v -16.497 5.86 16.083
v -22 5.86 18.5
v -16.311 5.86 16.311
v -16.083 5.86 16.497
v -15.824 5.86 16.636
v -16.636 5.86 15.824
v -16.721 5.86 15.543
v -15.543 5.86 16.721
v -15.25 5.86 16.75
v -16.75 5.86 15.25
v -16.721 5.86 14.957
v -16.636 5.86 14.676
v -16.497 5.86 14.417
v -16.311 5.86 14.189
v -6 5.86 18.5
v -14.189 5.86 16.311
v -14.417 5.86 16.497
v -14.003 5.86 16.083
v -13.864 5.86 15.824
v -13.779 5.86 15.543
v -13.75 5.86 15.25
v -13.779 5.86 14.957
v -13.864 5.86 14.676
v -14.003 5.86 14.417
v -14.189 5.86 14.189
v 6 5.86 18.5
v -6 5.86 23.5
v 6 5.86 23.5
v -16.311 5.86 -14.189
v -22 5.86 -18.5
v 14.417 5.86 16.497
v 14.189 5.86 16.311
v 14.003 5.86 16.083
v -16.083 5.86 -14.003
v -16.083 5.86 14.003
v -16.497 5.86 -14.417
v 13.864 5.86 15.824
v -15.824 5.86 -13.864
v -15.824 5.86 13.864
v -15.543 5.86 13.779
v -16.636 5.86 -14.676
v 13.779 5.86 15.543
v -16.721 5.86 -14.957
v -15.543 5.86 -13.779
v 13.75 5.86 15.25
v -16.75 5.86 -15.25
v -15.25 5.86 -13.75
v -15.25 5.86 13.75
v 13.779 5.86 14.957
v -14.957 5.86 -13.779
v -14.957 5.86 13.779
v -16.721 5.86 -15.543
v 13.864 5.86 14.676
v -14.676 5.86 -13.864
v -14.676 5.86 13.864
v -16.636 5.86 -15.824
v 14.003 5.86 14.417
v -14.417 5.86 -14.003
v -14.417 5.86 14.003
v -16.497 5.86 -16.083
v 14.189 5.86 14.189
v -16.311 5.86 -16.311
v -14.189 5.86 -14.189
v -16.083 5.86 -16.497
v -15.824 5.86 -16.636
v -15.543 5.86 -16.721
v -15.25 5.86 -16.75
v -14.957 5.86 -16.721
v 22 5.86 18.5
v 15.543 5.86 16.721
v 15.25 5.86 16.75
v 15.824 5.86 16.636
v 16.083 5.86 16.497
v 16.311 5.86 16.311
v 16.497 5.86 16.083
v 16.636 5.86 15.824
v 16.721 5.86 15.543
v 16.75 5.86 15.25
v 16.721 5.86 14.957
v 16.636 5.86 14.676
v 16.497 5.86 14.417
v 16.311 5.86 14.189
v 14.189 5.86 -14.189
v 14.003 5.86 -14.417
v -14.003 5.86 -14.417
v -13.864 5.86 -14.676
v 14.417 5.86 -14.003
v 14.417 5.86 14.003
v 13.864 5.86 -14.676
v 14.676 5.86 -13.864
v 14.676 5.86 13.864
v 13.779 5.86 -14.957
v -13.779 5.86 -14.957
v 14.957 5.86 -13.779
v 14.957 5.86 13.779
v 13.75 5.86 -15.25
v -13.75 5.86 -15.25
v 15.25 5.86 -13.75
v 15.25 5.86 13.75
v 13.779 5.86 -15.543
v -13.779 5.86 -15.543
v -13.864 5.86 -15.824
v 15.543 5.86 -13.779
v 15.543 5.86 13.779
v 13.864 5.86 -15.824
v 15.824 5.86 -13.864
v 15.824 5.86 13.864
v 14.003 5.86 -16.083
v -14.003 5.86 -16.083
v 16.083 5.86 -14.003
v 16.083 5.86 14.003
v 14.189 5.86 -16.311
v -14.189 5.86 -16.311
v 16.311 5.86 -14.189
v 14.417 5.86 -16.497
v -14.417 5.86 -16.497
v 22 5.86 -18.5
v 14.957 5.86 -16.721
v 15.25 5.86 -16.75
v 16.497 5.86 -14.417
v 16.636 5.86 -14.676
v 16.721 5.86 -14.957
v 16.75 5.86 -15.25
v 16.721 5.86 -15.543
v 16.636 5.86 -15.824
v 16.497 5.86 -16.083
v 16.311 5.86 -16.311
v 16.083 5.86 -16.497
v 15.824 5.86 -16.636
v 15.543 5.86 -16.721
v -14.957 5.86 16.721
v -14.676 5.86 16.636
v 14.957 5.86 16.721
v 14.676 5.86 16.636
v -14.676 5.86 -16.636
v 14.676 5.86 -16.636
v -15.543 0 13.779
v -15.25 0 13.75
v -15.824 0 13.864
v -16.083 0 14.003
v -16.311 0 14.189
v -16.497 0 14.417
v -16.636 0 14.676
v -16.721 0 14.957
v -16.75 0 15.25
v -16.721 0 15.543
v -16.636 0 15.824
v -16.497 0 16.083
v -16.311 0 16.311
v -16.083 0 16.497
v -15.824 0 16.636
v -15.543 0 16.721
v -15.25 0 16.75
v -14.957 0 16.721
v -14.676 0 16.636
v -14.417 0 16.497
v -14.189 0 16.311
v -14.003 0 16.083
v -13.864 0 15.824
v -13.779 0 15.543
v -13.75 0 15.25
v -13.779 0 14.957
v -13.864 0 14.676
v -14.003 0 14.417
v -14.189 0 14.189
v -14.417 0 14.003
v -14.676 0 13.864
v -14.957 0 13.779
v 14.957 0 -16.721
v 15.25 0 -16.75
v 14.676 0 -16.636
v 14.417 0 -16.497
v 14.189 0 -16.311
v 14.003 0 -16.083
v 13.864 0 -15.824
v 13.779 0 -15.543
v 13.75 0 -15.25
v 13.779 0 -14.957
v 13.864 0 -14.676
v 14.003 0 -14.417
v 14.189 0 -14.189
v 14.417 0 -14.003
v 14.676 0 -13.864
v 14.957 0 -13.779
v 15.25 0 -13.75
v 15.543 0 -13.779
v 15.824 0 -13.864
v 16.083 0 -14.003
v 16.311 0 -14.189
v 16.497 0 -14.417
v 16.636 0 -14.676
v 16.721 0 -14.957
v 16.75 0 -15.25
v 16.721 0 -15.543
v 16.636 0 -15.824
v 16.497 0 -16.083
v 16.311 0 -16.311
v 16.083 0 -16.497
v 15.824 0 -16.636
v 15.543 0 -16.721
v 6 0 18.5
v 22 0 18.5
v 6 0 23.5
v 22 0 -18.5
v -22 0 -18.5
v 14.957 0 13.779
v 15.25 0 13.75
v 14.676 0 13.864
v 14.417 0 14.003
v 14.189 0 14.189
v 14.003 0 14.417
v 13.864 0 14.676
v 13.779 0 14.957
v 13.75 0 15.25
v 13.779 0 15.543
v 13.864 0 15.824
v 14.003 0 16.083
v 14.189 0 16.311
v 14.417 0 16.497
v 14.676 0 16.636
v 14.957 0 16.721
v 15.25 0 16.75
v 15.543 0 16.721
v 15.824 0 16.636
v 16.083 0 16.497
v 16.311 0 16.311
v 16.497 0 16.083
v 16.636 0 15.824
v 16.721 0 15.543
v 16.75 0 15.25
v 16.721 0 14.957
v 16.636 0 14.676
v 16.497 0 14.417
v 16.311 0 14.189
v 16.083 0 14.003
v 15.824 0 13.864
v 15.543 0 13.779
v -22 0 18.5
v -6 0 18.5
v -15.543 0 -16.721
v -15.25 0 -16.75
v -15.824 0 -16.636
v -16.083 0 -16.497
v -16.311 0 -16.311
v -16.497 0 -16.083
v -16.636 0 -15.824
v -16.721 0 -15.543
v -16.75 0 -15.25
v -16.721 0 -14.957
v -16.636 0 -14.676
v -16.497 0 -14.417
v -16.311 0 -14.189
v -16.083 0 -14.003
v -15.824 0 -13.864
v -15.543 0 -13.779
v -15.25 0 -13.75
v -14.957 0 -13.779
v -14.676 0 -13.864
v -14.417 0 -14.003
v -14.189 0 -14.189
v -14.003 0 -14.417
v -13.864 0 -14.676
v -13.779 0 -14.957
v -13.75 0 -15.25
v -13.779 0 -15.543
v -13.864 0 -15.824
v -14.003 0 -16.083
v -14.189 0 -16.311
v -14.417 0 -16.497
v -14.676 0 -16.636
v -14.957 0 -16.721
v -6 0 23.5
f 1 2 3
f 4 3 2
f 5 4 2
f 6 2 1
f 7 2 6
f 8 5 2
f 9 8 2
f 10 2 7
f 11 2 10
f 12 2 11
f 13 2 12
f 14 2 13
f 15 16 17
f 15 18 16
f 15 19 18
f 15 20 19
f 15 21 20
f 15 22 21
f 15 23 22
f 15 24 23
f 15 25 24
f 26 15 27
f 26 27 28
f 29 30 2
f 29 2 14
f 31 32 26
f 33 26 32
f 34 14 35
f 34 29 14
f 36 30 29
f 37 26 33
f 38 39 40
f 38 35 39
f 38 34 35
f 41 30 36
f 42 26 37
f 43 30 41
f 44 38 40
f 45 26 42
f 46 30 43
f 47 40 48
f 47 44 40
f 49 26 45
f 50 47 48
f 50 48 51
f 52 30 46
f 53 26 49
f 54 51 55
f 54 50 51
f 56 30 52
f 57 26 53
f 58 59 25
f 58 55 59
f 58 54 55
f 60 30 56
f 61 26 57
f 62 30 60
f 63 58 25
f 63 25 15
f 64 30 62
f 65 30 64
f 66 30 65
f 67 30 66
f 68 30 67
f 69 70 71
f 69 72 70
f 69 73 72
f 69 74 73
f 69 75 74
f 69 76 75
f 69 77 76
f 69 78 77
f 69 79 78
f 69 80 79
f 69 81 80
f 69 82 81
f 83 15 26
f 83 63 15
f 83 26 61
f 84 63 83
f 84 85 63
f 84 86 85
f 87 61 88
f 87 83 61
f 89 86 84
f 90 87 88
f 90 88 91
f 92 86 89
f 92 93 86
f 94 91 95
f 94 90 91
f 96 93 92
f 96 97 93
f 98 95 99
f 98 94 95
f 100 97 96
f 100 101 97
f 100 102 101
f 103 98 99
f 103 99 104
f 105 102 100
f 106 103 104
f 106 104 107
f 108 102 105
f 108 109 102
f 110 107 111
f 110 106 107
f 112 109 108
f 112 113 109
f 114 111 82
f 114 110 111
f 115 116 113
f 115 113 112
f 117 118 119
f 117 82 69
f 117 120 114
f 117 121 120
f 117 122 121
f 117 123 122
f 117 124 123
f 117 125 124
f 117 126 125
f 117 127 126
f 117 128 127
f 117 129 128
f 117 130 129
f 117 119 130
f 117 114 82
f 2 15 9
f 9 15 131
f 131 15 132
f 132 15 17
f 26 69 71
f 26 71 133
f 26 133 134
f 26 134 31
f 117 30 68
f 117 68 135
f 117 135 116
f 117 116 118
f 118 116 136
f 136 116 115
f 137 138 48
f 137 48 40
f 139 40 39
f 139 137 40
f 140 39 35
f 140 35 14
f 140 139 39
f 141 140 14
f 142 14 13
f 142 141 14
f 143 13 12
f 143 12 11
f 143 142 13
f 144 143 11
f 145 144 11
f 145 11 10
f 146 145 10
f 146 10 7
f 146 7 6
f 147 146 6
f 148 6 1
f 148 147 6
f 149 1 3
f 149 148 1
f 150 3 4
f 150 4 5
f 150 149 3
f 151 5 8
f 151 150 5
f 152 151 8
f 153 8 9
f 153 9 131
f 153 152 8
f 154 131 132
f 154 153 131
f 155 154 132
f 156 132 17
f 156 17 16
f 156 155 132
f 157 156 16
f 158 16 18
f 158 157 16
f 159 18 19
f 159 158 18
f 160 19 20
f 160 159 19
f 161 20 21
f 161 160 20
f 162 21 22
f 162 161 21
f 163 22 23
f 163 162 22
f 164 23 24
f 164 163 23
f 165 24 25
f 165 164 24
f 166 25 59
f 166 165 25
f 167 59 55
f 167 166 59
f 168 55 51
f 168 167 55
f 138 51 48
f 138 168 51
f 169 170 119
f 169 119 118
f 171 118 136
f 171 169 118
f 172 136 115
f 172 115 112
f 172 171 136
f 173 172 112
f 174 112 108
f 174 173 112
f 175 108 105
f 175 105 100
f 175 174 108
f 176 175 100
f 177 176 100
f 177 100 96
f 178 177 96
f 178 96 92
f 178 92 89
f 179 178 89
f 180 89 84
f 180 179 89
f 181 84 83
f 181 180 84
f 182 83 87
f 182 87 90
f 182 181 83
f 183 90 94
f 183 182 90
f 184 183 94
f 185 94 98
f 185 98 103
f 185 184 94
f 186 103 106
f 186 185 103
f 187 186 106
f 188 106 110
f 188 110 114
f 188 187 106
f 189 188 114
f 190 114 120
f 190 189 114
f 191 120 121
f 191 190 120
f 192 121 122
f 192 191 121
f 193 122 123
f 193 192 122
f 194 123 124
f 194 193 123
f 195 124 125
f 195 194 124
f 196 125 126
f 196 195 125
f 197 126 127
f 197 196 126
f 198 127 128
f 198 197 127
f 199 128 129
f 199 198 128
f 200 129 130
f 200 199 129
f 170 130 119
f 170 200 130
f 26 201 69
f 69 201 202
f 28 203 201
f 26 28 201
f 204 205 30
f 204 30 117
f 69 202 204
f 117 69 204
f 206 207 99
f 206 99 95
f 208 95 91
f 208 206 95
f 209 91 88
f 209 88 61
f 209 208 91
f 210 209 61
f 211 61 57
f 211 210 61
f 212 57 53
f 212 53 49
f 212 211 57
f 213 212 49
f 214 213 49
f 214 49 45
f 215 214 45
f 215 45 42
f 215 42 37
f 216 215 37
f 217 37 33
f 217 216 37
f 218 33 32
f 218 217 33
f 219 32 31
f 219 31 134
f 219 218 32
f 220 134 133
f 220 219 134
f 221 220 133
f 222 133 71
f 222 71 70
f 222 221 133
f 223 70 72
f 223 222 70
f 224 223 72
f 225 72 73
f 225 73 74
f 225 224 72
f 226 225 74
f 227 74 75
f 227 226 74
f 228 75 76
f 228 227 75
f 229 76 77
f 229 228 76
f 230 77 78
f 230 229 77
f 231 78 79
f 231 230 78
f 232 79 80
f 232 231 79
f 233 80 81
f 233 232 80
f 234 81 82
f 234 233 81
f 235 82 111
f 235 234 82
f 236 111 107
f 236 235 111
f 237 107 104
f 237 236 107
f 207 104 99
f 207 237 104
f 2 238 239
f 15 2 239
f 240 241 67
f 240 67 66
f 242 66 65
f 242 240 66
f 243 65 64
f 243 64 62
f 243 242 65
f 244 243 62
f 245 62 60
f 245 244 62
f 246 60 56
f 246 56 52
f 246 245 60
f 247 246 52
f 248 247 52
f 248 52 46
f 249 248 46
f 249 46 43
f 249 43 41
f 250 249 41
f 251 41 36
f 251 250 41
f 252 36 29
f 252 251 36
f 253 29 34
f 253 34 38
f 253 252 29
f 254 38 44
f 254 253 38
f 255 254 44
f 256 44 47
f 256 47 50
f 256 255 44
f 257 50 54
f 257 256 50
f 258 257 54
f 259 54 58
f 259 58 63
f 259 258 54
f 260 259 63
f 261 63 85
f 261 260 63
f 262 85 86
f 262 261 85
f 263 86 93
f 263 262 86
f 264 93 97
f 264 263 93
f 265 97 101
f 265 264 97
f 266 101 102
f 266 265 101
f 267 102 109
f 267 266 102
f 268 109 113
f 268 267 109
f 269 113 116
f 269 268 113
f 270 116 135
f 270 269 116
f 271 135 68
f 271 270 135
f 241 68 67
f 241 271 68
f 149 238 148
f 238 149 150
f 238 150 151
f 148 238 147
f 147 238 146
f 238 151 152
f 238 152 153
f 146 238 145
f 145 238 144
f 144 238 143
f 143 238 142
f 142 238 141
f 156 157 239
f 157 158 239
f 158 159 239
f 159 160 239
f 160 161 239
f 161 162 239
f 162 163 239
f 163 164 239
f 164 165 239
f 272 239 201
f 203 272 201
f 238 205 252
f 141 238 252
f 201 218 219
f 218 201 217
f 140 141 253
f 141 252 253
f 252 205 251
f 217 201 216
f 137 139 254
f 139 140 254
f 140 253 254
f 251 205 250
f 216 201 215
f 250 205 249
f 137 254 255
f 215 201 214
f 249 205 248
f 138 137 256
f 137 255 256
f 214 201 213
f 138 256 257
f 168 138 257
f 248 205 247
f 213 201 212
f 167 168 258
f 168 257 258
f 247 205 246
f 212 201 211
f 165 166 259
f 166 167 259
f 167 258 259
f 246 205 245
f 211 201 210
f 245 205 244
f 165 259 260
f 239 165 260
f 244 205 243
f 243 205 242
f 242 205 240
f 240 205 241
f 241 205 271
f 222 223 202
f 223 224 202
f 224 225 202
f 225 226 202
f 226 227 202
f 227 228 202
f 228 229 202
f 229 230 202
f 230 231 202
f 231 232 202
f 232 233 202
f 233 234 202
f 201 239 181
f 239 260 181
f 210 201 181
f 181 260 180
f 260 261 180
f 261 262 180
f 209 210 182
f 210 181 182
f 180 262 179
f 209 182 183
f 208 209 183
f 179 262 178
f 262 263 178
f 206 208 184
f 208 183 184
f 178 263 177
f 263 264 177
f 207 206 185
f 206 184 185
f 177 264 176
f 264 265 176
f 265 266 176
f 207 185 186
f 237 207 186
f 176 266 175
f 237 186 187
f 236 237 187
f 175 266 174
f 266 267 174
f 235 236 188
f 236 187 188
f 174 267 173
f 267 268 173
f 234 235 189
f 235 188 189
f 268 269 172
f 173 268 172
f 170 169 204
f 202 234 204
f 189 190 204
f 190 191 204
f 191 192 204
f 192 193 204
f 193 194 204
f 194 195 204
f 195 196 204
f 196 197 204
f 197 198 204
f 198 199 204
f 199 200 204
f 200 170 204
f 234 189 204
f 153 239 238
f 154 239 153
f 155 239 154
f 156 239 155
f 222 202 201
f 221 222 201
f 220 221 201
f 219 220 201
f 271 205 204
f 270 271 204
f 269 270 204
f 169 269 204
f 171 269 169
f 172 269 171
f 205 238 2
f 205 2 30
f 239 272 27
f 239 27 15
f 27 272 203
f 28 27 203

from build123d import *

# Parameters (mm, degrees)
SKETCH_1_W      = 44
SKETCH_1_H      = 37
SKETCH_1_R      = 1.5
SKETCH_1_W_2    = 12
SKETCH_1_H_2    = 5
EXTRUDE_1_DEPTH = 5.86


with BuildPart() as part:
    # 草图1 → 凸台-拉伸1 (new body)
    # profile 1 of 2: a face of its own
    with BuildSketch(Plane(origin=(0, 0, 0), x_dir=(1, 0, 0), z_dir=(0, 1, 0))):
        Rectangle(SKETCH_1_W, SKETCH_1_H)
        with Locations(Location((-15.25, -15.25, 0), (0, 0, 90))):
            Circle(SKETCH_1_R, mode=Mode.SUBTRACT)
        with Locations(Location((15.25, -15.25, 0), (0, 0, 90))):
            Circle(SKETCH_1_R, mode=Mode.SUBTRACT)
        with Locations(Location((15.25, 15.25, 0), (0, 0, 90))):
            Circle(SKETCH_1_R, mode=Mode.SUBTRACT)
        with Locations(Location((-15.25, 15.25, 0), (0, 0, 90))):
            Circle(SKETCH_1_R, mode=Mode.SUBTRACT)
    # profile 2 of 2: a face of its own
    with BuildSketch(Plane(origin=(0, 0, 0), x_dir=(1, 0, 0), z_dir=(0, 1, 0))):
        with Locations((0, -21)):
            Rectangle(SKETCH_1_W_2, SKETCH_1_H_2)
    extrude(amount=EXTRUDE_1_DEPTH)


solid = part.part
